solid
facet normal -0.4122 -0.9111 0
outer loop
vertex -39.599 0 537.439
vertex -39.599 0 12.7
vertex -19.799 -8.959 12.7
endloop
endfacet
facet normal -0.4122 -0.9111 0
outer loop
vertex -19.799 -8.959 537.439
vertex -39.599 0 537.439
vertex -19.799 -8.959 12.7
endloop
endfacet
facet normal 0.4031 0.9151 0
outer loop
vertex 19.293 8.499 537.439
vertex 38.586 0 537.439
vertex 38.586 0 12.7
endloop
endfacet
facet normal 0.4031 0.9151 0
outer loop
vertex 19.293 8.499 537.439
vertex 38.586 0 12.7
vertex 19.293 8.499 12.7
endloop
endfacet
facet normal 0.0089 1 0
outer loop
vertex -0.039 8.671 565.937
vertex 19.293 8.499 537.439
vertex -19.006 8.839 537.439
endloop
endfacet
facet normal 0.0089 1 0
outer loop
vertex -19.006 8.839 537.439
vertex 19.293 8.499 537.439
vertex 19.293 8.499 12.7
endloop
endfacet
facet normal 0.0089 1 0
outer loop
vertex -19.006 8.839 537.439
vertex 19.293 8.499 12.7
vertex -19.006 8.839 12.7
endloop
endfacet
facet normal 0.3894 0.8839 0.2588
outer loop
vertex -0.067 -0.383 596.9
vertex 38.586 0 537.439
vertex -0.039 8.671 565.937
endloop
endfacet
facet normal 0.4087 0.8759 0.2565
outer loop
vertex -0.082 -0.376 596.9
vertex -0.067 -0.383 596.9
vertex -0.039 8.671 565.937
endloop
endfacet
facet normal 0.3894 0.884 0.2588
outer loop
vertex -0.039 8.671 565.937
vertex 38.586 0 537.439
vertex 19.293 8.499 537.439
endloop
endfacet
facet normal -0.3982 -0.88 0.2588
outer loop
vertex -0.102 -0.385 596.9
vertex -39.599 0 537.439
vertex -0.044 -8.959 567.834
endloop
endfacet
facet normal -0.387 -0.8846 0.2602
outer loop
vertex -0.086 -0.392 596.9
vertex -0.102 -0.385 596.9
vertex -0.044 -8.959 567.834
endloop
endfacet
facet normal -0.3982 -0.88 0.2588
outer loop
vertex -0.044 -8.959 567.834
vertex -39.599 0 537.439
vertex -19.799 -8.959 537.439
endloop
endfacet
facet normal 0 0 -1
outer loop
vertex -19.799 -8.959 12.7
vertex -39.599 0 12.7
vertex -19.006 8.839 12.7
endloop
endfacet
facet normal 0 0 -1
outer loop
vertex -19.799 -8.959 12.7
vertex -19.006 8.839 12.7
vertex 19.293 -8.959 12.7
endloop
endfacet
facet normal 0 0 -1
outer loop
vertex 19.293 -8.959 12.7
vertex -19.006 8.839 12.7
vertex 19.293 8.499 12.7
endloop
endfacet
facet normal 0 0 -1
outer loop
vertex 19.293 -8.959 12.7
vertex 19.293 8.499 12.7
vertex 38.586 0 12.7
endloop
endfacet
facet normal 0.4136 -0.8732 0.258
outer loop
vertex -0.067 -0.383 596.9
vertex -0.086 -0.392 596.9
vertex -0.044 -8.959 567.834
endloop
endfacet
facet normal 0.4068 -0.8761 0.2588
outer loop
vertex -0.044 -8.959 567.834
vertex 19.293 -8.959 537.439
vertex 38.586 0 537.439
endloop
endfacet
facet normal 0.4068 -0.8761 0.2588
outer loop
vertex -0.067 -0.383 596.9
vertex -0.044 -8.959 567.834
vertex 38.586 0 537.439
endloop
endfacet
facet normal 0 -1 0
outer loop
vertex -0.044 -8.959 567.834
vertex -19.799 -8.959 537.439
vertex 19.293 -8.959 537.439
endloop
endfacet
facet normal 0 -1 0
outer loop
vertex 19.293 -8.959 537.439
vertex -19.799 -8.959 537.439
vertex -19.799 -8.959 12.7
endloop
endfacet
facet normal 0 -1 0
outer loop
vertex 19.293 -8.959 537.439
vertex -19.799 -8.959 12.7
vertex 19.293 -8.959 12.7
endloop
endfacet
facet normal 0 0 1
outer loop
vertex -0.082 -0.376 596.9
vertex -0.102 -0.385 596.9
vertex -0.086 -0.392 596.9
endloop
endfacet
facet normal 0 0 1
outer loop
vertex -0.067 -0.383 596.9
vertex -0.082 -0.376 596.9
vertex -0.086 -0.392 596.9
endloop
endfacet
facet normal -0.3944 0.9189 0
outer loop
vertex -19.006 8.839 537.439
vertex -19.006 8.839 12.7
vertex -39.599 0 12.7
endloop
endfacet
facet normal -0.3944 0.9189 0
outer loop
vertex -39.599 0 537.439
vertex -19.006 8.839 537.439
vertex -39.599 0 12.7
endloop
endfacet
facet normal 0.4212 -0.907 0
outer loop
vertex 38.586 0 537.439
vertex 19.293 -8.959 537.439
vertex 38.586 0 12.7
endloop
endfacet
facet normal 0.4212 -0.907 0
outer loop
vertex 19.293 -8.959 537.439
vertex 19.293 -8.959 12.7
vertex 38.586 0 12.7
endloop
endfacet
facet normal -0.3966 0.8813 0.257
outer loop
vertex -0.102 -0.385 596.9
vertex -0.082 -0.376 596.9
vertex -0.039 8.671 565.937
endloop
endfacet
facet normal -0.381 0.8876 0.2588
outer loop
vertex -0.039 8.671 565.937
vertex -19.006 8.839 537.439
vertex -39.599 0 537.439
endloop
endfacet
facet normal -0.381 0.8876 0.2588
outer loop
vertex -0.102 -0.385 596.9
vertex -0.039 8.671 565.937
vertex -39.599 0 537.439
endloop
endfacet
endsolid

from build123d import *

# Parameters (mm, degrees)
F0_W      = 79.5655027032
F0_H      = 36.2267494202
F1_DEPTH  = 12.7
F2_DEPTH  = 12.7
F4_DEPTH  = 508
F7_DEPTH  = 76.2
F8_SIZE2  = 59.4614
F8_SIZE   = 15.9326341108
F9_DEPTH  = 25.4
F10_DEPTH = 25.4
F12_DEPTH = 990.6


with BuildPart() as f1:
    # F0 (on Top) → F1 (new body)
    with BuildSketch(Plane.XY):
        with Locations((-0.5556233227, -0.4444997758)):
            Rectangle(F0_W, F0_H)
    extrude(amount=F1_DEPTH)

    # F2 (add): a face of the model
    f2_faces = [f1.faces().sort_by_distance(p)[0] for p in [
        (-0.5556233227, -0.4444997758, 0),
    ]]
    extrude(f2_faces, amount=F2_DEPTH)

    # F3 (on face) → F4 (join)
    with BuildSketch(Plane.XY.offset(12.7)):
        Polygon((-39.5987667143, 0), (0, -17.9184600711), (38.5859385133, 0), (0, 16.9973578304), align=None)
    extrude(amount=F4_DEPTH)

    # F5 (on face) → F7 (join)
    with BuildSketch(Plane.XY.offset(520.7)):
        Polygon((0, 16.9973578304), (-39.5987667143, 0), (0, -17.9184600711), (38.5859385133, 0), align=None)
    extrude(amount=F7_DEPTH)

    # F8
    f8_edges = [f1.edges().sort_by_distance(p)[0] for p in [
        (-19.799383, 8.498679, 596.9),
        (-19.799383, -8.95923, 596.9),
        (19.292969, -8.95923, 596.9),
        (19.292969, 8.498679, 596.9),
    ]]
    f8_side = f1.faces().sort_by_distance((-0.337609, -0.307034, 596.9))[0]
    chamfer(f8_edges, length=F8_SIZE, length2=F8_SIZE2, reference=f8_side)

    # F9 (cut): a face of the model
    f9_faces = [f1.faces().sort_by_distance(p)[0] for p in [
        (-0.5556233227, 17.6688749343, 0),
    ]]
    extrude(f9_faces, amount=-F9_DEPTH, mode=Mode.SUBTRACT)

    # F10 (cut): a face of the model
    f10_faces = [f1.faces().sort_by_distance(p)[0] for p in [
        (-0.5556233227, -18.5578744859, 0),
    ]]
    extrude(f10_faces, amount=-F10_DEPTH, mode=Mode.SUBTRACT)

    # F11 (on face) → F12 (cut)
    with BuildSketch(Plane(origin=(0, 0, 12.7), x_dir=(1, 0, 0), z_dir=(0, 0, -1))):
        Polygon((19.2929692566, -8.4986789152), (-19.0062443799, -8.8391255534), (0, -16.9973578304), align=None)
        Polygon((0, 17.9184600711), (-19.7993833572, 8.9592300355), (19.2929692566, 8.9592300355), align=None)
    extrude(amount=-F12_DEPTH, mode=Mode.SUBTRACT)


solid = f1.part
